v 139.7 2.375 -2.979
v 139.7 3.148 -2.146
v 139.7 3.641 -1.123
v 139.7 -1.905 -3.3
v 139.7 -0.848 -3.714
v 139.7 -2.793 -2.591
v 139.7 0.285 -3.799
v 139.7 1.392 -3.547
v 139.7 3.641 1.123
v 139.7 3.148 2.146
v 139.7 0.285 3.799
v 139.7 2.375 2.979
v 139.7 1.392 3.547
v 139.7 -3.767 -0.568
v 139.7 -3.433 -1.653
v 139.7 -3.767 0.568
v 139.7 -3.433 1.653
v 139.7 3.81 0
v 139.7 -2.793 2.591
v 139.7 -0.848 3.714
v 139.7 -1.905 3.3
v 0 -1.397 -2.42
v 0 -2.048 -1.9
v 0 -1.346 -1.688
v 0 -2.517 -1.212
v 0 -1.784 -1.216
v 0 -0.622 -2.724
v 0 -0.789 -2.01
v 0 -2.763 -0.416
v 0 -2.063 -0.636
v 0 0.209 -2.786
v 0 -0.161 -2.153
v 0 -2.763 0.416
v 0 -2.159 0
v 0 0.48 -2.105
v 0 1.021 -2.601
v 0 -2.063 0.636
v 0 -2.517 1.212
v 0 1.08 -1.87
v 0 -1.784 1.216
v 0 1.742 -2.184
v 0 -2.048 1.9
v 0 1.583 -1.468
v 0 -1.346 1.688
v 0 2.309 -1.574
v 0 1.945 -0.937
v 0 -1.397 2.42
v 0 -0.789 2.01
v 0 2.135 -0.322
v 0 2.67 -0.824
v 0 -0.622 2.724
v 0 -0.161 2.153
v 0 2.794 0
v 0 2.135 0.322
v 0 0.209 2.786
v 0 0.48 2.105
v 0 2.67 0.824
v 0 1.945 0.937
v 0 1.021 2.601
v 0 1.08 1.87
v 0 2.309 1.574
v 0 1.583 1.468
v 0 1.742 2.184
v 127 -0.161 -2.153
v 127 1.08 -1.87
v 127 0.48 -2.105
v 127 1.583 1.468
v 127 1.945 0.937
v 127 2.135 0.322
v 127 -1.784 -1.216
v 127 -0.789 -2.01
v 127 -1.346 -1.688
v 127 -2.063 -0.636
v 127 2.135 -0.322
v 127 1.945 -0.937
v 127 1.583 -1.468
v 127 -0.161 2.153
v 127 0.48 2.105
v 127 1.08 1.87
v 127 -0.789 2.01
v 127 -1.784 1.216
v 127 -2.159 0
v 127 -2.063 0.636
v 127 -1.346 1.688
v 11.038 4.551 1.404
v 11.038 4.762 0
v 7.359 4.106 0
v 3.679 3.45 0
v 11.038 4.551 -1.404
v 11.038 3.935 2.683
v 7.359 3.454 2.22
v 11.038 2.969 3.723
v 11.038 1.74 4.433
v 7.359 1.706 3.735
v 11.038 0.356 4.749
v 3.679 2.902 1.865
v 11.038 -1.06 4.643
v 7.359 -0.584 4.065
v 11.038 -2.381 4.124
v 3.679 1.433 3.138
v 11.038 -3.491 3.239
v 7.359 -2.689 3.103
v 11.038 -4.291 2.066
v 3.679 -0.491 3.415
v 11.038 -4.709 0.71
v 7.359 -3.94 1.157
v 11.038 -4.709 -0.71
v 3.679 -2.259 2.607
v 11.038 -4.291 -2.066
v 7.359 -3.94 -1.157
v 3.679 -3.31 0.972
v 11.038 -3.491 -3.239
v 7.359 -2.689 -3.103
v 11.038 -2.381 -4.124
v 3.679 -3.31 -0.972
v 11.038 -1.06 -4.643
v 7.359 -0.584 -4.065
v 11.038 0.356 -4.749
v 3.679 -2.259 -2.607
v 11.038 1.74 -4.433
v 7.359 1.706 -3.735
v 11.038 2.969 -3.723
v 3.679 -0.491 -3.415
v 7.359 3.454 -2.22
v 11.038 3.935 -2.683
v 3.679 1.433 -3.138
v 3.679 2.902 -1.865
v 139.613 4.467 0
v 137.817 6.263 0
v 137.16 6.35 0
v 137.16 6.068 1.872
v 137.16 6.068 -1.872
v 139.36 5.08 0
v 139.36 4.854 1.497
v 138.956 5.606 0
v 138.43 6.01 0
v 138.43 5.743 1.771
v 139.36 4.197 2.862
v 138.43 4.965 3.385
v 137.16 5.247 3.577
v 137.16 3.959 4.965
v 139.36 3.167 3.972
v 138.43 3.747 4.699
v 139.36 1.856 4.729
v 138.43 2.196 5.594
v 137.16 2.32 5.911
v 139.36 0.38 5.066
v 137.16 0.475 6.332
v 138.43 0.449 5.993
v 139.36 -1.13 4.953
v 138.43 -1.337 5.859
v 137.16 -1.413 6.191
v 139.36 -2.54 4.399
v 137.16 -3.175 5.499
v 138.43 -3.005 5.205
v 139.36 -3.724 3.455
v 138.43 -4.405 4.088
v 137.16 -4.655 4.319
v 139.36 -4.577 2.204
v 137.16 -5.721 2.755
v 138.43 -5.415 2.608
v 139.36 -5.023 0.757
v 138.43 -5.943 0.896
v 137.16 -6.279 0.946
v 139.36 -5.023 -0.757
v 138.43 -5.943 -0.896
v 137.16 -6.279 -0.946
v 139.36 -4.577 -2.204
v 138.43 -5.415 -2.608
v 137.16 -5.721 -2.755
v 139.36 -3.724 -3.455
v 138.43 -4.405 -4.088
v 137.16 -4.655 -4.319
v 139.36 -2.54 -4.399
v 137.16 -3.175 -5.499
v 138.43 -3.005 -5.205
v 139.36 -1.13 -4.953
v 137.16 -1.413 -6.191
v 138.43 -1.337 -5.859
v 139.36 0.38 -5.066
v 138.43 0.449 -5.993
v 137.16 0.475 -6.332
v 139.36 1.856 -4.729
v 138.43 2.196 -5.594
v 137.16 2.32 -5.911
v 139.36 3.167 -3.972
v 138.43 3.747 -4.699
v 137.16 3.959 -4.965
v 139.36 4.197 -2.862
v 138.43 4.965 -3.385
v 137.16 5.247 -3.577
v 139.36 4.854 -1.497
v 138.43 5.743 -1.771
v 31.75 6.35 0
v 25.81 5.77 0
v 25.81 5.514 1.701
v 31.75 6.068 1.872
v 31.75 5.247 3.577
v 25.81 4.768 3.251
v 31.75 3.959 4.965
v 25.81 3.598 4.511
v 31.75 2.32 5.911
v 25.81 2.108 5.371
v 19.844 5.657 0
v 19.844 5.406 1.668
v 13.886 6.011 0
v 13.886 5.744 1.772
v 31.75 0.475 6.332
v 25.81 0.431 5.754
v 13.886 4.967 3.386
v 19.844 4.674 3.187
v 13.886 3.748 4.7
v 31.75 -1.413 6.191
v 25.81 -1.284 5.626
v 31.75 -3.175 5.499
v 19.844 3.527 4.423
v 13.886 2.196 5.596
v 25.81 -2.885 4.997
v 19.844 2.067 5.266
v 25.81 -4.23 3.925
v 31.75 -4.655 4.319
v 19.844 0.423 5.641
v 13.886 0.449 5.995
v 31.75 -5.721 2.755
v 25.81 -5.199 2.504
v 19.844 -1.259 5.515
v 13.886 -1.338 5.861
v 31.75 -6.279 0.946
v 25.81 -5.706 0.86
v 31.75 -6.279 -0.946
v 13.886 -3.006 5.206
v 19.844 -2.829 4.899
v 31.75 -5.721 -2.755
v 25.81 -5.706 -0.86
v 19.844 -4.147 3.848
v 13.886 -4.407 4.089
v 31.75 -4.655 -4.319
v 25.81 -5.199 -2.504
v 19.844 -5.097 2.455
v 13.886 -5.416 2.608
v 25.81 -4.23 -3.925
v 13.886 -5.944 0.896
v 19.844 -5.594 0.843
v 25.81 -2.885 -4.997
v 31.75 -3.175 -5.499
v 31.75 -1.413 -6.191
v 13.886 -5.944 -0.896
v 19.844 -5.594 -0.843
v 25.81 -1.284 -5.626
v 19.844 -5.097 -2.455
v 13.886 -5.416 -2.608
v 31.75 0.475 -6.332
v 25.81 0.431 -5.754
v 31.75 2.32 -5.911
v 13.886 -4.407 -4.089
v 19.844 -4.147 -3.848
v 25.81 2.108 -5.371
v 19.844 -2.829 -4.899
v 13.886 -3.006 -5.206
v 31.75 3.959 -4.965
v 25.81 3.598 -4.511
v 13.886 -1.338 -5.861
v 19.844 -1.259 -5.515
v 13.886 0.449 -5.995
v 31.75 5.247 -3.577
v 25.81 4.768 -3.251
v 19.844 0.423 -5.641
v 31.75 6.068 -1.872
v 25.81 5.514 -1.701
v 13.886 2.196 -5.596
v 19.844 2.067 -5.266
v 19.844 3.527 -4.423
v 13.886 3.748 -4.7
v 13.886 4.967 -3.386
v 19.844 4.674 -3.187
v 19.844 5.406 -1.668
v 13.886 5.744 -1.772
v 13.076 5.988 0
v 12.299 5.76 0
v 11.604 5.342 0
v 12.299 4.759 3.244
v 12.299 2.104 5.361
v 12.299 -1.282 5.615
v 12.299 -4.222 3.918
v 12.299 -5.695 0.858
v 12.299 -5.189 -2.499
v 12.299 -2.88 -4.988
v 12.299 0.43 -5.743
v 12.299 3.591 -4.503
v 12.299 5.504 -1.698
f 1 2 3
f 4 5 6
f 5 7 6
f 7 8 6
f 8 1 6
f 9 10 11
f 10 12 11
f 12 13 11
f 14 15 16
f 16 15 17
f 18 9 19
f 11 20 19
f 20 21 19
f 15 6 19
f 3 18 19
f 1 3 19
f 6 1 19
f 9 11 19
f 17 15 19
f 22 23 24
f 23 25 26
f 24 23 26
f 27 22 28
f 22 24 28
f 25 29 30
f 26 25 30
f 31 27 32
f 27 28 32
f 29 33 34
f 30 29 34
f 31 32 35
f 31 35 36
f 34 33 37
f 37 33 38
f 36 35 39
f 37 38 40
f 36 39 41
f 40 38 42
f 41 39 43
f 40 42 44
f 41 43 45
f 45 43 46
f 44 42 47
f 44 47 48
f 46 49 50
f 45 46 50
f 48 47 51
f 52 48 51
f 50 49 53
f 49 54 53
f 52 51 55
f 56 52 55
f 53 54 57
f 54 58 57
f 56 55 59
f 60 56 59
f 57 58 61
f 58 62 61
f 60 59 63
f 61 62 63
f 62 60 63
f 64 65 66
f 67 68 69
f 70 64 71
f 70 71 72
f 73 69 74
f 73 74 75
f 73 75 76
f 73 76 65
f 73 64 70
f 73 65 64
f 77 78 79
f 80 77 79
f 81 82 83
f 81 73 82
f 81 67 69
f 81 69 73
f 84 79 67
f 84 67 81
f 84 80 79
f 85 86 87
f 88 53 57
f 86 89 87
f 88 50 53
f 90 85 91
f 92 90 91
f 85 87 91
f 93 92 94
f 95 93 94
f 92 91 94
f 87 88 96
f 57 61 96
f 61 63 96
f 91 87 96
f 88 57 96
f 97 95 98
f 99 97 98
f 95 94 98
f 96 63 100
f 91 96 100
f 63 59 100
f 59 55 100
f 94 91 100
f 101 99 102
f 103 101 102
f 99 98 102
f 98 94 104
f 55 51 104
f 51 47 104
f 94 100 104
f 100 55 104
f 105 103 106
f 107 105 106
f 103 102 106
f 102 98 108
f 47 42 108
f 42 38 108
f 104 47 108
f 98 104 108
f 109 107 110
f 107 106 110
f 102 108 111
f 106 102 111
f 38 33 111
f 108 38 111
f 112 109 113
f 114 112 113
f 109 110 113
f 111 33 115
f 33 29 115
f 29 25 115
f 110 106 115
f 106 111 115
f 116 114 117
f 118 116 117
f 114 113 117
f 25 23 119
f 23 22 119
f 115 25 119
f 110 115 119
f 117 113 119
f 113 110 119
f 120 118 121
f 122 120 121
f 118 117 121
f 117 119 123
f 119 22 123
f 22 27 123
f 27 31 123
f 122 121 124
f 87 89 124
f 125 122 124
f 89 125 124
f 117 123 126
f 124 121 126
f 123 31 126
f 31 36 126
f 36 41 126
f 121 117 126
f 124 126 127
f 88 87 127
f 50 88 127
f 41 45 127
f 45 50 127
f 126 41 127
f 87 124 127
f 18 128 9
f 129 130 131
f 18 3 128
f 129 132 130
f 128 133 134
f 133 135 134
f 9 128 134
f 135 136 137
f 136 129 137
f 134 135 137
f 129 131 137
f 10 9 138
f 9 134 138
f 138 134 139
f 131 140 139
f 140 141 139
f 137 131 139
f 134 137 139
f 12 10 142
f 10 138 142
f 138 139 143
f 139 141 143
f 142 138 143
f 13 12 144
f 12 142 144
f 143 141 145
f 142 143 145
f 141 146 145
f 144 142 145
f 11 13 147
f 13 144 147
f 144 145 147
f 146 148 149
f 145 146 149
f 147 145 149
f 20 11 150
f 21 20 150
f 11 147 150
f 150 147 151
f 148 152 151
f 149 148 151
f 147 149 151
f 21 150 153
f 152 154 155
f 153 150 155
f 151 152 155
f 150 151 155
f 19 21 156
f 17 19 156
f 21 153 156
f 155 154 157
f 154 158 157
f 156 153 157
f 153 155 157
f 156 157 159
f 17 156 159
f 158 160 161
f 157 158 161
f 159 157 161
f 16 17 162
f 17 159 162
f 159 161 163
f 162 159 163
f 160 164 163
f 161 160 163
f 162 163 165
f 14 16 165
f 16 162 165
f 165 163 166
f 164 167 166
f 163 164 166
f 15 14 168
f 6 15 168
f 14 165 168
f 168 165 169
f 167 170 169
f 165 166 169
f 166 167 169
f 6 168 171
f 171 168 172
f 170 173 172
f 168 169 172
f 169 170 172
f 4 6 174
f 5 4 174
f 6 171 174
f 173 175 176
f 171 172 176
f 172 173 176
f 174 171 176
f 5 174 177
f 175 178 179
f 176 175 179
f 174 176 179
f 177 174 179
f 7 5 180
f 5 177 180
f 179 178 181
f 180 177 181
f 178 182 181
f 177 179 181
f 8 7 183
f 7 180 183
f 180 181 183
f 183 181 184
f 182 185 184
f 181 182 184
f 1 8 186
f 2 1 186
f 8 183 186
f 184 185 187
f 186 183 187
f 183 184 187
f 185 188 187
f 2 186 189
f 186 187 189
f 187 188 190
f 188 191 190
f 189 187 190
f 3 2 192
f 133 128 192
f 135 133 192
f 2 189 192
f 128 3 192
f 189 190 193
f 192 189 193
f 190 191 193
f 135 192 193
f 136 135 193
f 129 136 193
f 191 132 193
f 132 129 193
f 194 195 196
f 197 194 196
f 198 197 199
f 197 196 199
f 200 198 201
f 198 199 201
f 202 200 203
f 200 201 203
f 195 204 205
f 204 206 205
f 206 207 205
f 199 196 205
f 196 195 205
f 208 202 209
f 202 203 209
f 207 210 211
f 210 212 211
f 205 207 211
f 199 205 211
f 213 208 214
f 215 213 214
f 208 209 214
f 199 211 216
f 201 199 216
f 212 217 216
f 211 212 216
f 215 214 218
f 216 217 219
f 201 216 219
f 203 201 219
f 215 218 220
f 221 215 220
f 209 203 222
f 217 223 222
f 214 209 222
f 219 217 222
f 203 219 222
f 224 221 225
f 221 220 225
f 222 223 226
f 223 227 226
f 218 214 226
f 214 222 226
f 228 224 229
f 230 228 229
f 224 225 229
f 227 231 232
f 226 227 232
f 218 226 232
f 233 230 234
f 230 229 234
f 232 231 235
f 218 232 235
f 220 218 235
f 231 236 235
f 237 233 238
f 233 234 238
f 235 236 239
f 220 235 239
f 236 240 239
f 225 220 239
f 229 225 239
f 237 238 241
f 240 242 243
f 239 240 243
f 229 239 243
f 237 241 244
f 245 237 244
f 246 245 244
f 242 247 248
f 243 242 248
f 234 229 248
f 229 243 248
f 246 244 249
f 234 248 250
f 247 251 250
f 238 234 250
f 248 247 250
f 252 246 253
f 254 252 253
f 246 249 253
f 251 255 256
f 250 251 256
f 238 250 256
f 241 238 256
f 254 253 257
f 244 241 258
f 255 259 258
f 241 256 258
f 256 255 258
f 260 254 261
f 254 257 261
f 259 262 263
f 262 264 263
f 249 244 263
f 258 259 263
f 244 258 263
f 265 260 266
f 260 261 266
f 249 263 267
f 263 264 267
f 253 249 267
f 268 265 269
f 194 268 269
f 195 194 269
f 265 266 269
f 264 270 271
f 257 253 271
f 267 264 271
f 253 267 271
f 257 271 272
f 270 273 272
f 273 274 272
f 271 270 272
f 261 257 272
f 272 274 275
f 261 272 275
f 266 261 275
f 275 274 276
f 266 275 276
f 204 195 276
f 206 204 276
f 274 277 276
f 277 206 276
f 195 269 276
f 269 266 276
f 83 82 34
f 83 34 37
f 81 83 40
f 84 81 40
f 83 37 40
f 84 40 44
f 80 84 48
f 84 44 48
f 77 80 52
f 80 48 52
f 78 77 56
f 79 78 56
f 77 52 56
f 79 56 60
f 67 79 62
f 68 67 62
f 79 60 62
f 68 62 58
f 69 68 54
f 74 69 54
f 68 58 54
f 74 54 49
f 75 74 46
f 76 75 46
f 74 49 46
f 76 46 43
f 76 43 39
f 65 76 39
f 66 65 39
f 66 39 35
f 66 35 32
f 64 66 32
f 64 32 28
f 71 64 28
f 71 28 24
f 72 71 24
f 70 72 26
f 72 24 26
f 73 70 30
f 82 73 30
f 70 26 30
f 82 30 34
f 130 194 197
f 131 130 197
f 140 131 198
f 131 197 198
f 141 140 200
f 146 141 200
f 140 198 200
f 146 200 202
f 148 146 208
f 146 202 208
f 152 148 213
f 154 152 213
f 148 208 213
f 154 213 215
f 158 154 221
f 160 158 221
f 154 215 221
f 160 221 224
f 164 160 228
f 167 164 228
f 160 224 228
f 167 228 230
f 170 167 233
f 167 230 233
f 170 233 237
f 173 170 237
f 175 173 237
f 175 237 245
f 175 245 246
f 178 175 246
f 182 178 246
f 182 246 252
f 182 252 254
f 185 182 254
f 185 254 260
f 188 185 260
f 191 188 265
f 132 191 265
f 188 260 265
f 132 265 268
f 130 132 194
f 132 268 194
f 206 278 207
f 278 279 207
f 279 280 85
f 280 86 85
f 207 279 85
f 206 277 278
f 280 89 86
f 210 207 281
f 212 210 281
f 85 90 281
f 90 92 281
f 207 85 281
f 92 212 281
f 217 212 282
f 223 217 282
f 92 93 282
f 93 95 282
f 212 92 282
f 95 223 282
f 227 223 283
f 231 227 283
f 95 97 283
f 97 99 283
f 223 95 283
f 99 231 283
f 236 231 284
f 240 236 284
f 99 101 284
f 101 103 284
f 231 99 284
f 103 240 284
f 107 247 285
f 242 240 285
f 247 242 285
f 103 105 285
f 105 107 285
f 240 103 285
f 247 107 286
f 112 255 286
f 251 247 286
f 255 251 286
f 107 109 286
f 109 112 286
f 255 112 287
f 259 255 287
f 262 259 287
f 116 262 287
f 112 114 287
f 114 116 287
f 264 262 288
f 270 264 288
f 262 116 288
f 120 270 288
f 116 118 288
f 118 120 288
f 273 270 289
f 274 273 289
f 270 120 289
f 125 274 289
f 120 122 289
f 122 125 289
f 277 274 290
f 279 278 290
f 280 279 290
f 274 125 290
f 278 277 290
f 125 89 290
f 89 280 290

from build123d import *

# Parameters (mm, degrees)
F2_R     = 2.54
F3_R     = 2.159
F4_DEPTH = 127


# Not quite as in the source:
# - a fillet or chamfer that OpenCascade refuses, or shapes differently, is made with other operations: its cross-section is extruded or revolved along the edge and cut away or added


with BuildPart() as f1:
    # F0 (on Top) → F1 (revolve)
    with BuildSketch(Plane.XY):
        with BuildLine():
            Line((0, 2.794), (0, 0))
            Line((0, 0), (139.7, 0))
            Line((139.7, 0), (139.7, 6.35))
            Line((139.7, 6.35), (31.75, 6.35))
            ThreePointArc((31.75, 6.35), (21.3842908829, 5.6416689079), (11.0185817658, 6.35))
            ThreePointArc((11.0185817658, 6.35), (10.9918000406, 5.5558048596), (11.0379582651, 4.7625))
            Line((11.0379582651, 4.7625), (0, 2.794))
        make_face()
    revolve(axis=Axis((69.85, 0, 0), (1, 0, 0)))

    # F2
    f2_edges = [f1.edges().sort_by_distance(p)[0] for p in [
        (139.7, -6.35, 0),
    ]]
    fillet(f2_edges, radius=F2_R)

    # F3 (on face) → F4 (cut)
    with BuildSketch(Plane(origin=(0, 0, 0), x_dir=(0, -1, 0), z_dir=(-1, 0, 0))):
        Circle(F3_R)
    extrude(amount=-F4_DEPTH, mode=Mode.SUBTRACT)

    # F5: fillet of radius 3.175 on 1 edges, made by hand

    # F5_s1 → F5_t2 (revolve, cut)
    with BuildSketch(Plane.XY):
        with BuildLine():
            ThreePointArc((13.886159803, 6.0114768317), (12.2986630958, 5.7596010622), (11.0379582651, 4.7625))
            Line((11.0379582651, 4.7625), (10.9872426769, 4.8007122901))
            ThreePointArc((10.9872426769, 4.8007122901), (10.9283047702, 5.5550298573), (10.9552829498, 6.3550507327))
            Line((10.9552829498, 6.3550507327), (11.0272198567, 6.4129097241))
            ThreePointArc((11.0272198567, 6.4129097241), (12.4582117618, 6.2302164435), (13.8924082455, 6.0746686585))
            Line((13.8924082455, 6.0746686585), (13.886159803, 6.0114768317))
        make_face()
    revolve(axis=Axis((11.0185817658, 0, 0), (1, 0, 0)), mode=Mode.SUBTRACT)


solid = f1.part
